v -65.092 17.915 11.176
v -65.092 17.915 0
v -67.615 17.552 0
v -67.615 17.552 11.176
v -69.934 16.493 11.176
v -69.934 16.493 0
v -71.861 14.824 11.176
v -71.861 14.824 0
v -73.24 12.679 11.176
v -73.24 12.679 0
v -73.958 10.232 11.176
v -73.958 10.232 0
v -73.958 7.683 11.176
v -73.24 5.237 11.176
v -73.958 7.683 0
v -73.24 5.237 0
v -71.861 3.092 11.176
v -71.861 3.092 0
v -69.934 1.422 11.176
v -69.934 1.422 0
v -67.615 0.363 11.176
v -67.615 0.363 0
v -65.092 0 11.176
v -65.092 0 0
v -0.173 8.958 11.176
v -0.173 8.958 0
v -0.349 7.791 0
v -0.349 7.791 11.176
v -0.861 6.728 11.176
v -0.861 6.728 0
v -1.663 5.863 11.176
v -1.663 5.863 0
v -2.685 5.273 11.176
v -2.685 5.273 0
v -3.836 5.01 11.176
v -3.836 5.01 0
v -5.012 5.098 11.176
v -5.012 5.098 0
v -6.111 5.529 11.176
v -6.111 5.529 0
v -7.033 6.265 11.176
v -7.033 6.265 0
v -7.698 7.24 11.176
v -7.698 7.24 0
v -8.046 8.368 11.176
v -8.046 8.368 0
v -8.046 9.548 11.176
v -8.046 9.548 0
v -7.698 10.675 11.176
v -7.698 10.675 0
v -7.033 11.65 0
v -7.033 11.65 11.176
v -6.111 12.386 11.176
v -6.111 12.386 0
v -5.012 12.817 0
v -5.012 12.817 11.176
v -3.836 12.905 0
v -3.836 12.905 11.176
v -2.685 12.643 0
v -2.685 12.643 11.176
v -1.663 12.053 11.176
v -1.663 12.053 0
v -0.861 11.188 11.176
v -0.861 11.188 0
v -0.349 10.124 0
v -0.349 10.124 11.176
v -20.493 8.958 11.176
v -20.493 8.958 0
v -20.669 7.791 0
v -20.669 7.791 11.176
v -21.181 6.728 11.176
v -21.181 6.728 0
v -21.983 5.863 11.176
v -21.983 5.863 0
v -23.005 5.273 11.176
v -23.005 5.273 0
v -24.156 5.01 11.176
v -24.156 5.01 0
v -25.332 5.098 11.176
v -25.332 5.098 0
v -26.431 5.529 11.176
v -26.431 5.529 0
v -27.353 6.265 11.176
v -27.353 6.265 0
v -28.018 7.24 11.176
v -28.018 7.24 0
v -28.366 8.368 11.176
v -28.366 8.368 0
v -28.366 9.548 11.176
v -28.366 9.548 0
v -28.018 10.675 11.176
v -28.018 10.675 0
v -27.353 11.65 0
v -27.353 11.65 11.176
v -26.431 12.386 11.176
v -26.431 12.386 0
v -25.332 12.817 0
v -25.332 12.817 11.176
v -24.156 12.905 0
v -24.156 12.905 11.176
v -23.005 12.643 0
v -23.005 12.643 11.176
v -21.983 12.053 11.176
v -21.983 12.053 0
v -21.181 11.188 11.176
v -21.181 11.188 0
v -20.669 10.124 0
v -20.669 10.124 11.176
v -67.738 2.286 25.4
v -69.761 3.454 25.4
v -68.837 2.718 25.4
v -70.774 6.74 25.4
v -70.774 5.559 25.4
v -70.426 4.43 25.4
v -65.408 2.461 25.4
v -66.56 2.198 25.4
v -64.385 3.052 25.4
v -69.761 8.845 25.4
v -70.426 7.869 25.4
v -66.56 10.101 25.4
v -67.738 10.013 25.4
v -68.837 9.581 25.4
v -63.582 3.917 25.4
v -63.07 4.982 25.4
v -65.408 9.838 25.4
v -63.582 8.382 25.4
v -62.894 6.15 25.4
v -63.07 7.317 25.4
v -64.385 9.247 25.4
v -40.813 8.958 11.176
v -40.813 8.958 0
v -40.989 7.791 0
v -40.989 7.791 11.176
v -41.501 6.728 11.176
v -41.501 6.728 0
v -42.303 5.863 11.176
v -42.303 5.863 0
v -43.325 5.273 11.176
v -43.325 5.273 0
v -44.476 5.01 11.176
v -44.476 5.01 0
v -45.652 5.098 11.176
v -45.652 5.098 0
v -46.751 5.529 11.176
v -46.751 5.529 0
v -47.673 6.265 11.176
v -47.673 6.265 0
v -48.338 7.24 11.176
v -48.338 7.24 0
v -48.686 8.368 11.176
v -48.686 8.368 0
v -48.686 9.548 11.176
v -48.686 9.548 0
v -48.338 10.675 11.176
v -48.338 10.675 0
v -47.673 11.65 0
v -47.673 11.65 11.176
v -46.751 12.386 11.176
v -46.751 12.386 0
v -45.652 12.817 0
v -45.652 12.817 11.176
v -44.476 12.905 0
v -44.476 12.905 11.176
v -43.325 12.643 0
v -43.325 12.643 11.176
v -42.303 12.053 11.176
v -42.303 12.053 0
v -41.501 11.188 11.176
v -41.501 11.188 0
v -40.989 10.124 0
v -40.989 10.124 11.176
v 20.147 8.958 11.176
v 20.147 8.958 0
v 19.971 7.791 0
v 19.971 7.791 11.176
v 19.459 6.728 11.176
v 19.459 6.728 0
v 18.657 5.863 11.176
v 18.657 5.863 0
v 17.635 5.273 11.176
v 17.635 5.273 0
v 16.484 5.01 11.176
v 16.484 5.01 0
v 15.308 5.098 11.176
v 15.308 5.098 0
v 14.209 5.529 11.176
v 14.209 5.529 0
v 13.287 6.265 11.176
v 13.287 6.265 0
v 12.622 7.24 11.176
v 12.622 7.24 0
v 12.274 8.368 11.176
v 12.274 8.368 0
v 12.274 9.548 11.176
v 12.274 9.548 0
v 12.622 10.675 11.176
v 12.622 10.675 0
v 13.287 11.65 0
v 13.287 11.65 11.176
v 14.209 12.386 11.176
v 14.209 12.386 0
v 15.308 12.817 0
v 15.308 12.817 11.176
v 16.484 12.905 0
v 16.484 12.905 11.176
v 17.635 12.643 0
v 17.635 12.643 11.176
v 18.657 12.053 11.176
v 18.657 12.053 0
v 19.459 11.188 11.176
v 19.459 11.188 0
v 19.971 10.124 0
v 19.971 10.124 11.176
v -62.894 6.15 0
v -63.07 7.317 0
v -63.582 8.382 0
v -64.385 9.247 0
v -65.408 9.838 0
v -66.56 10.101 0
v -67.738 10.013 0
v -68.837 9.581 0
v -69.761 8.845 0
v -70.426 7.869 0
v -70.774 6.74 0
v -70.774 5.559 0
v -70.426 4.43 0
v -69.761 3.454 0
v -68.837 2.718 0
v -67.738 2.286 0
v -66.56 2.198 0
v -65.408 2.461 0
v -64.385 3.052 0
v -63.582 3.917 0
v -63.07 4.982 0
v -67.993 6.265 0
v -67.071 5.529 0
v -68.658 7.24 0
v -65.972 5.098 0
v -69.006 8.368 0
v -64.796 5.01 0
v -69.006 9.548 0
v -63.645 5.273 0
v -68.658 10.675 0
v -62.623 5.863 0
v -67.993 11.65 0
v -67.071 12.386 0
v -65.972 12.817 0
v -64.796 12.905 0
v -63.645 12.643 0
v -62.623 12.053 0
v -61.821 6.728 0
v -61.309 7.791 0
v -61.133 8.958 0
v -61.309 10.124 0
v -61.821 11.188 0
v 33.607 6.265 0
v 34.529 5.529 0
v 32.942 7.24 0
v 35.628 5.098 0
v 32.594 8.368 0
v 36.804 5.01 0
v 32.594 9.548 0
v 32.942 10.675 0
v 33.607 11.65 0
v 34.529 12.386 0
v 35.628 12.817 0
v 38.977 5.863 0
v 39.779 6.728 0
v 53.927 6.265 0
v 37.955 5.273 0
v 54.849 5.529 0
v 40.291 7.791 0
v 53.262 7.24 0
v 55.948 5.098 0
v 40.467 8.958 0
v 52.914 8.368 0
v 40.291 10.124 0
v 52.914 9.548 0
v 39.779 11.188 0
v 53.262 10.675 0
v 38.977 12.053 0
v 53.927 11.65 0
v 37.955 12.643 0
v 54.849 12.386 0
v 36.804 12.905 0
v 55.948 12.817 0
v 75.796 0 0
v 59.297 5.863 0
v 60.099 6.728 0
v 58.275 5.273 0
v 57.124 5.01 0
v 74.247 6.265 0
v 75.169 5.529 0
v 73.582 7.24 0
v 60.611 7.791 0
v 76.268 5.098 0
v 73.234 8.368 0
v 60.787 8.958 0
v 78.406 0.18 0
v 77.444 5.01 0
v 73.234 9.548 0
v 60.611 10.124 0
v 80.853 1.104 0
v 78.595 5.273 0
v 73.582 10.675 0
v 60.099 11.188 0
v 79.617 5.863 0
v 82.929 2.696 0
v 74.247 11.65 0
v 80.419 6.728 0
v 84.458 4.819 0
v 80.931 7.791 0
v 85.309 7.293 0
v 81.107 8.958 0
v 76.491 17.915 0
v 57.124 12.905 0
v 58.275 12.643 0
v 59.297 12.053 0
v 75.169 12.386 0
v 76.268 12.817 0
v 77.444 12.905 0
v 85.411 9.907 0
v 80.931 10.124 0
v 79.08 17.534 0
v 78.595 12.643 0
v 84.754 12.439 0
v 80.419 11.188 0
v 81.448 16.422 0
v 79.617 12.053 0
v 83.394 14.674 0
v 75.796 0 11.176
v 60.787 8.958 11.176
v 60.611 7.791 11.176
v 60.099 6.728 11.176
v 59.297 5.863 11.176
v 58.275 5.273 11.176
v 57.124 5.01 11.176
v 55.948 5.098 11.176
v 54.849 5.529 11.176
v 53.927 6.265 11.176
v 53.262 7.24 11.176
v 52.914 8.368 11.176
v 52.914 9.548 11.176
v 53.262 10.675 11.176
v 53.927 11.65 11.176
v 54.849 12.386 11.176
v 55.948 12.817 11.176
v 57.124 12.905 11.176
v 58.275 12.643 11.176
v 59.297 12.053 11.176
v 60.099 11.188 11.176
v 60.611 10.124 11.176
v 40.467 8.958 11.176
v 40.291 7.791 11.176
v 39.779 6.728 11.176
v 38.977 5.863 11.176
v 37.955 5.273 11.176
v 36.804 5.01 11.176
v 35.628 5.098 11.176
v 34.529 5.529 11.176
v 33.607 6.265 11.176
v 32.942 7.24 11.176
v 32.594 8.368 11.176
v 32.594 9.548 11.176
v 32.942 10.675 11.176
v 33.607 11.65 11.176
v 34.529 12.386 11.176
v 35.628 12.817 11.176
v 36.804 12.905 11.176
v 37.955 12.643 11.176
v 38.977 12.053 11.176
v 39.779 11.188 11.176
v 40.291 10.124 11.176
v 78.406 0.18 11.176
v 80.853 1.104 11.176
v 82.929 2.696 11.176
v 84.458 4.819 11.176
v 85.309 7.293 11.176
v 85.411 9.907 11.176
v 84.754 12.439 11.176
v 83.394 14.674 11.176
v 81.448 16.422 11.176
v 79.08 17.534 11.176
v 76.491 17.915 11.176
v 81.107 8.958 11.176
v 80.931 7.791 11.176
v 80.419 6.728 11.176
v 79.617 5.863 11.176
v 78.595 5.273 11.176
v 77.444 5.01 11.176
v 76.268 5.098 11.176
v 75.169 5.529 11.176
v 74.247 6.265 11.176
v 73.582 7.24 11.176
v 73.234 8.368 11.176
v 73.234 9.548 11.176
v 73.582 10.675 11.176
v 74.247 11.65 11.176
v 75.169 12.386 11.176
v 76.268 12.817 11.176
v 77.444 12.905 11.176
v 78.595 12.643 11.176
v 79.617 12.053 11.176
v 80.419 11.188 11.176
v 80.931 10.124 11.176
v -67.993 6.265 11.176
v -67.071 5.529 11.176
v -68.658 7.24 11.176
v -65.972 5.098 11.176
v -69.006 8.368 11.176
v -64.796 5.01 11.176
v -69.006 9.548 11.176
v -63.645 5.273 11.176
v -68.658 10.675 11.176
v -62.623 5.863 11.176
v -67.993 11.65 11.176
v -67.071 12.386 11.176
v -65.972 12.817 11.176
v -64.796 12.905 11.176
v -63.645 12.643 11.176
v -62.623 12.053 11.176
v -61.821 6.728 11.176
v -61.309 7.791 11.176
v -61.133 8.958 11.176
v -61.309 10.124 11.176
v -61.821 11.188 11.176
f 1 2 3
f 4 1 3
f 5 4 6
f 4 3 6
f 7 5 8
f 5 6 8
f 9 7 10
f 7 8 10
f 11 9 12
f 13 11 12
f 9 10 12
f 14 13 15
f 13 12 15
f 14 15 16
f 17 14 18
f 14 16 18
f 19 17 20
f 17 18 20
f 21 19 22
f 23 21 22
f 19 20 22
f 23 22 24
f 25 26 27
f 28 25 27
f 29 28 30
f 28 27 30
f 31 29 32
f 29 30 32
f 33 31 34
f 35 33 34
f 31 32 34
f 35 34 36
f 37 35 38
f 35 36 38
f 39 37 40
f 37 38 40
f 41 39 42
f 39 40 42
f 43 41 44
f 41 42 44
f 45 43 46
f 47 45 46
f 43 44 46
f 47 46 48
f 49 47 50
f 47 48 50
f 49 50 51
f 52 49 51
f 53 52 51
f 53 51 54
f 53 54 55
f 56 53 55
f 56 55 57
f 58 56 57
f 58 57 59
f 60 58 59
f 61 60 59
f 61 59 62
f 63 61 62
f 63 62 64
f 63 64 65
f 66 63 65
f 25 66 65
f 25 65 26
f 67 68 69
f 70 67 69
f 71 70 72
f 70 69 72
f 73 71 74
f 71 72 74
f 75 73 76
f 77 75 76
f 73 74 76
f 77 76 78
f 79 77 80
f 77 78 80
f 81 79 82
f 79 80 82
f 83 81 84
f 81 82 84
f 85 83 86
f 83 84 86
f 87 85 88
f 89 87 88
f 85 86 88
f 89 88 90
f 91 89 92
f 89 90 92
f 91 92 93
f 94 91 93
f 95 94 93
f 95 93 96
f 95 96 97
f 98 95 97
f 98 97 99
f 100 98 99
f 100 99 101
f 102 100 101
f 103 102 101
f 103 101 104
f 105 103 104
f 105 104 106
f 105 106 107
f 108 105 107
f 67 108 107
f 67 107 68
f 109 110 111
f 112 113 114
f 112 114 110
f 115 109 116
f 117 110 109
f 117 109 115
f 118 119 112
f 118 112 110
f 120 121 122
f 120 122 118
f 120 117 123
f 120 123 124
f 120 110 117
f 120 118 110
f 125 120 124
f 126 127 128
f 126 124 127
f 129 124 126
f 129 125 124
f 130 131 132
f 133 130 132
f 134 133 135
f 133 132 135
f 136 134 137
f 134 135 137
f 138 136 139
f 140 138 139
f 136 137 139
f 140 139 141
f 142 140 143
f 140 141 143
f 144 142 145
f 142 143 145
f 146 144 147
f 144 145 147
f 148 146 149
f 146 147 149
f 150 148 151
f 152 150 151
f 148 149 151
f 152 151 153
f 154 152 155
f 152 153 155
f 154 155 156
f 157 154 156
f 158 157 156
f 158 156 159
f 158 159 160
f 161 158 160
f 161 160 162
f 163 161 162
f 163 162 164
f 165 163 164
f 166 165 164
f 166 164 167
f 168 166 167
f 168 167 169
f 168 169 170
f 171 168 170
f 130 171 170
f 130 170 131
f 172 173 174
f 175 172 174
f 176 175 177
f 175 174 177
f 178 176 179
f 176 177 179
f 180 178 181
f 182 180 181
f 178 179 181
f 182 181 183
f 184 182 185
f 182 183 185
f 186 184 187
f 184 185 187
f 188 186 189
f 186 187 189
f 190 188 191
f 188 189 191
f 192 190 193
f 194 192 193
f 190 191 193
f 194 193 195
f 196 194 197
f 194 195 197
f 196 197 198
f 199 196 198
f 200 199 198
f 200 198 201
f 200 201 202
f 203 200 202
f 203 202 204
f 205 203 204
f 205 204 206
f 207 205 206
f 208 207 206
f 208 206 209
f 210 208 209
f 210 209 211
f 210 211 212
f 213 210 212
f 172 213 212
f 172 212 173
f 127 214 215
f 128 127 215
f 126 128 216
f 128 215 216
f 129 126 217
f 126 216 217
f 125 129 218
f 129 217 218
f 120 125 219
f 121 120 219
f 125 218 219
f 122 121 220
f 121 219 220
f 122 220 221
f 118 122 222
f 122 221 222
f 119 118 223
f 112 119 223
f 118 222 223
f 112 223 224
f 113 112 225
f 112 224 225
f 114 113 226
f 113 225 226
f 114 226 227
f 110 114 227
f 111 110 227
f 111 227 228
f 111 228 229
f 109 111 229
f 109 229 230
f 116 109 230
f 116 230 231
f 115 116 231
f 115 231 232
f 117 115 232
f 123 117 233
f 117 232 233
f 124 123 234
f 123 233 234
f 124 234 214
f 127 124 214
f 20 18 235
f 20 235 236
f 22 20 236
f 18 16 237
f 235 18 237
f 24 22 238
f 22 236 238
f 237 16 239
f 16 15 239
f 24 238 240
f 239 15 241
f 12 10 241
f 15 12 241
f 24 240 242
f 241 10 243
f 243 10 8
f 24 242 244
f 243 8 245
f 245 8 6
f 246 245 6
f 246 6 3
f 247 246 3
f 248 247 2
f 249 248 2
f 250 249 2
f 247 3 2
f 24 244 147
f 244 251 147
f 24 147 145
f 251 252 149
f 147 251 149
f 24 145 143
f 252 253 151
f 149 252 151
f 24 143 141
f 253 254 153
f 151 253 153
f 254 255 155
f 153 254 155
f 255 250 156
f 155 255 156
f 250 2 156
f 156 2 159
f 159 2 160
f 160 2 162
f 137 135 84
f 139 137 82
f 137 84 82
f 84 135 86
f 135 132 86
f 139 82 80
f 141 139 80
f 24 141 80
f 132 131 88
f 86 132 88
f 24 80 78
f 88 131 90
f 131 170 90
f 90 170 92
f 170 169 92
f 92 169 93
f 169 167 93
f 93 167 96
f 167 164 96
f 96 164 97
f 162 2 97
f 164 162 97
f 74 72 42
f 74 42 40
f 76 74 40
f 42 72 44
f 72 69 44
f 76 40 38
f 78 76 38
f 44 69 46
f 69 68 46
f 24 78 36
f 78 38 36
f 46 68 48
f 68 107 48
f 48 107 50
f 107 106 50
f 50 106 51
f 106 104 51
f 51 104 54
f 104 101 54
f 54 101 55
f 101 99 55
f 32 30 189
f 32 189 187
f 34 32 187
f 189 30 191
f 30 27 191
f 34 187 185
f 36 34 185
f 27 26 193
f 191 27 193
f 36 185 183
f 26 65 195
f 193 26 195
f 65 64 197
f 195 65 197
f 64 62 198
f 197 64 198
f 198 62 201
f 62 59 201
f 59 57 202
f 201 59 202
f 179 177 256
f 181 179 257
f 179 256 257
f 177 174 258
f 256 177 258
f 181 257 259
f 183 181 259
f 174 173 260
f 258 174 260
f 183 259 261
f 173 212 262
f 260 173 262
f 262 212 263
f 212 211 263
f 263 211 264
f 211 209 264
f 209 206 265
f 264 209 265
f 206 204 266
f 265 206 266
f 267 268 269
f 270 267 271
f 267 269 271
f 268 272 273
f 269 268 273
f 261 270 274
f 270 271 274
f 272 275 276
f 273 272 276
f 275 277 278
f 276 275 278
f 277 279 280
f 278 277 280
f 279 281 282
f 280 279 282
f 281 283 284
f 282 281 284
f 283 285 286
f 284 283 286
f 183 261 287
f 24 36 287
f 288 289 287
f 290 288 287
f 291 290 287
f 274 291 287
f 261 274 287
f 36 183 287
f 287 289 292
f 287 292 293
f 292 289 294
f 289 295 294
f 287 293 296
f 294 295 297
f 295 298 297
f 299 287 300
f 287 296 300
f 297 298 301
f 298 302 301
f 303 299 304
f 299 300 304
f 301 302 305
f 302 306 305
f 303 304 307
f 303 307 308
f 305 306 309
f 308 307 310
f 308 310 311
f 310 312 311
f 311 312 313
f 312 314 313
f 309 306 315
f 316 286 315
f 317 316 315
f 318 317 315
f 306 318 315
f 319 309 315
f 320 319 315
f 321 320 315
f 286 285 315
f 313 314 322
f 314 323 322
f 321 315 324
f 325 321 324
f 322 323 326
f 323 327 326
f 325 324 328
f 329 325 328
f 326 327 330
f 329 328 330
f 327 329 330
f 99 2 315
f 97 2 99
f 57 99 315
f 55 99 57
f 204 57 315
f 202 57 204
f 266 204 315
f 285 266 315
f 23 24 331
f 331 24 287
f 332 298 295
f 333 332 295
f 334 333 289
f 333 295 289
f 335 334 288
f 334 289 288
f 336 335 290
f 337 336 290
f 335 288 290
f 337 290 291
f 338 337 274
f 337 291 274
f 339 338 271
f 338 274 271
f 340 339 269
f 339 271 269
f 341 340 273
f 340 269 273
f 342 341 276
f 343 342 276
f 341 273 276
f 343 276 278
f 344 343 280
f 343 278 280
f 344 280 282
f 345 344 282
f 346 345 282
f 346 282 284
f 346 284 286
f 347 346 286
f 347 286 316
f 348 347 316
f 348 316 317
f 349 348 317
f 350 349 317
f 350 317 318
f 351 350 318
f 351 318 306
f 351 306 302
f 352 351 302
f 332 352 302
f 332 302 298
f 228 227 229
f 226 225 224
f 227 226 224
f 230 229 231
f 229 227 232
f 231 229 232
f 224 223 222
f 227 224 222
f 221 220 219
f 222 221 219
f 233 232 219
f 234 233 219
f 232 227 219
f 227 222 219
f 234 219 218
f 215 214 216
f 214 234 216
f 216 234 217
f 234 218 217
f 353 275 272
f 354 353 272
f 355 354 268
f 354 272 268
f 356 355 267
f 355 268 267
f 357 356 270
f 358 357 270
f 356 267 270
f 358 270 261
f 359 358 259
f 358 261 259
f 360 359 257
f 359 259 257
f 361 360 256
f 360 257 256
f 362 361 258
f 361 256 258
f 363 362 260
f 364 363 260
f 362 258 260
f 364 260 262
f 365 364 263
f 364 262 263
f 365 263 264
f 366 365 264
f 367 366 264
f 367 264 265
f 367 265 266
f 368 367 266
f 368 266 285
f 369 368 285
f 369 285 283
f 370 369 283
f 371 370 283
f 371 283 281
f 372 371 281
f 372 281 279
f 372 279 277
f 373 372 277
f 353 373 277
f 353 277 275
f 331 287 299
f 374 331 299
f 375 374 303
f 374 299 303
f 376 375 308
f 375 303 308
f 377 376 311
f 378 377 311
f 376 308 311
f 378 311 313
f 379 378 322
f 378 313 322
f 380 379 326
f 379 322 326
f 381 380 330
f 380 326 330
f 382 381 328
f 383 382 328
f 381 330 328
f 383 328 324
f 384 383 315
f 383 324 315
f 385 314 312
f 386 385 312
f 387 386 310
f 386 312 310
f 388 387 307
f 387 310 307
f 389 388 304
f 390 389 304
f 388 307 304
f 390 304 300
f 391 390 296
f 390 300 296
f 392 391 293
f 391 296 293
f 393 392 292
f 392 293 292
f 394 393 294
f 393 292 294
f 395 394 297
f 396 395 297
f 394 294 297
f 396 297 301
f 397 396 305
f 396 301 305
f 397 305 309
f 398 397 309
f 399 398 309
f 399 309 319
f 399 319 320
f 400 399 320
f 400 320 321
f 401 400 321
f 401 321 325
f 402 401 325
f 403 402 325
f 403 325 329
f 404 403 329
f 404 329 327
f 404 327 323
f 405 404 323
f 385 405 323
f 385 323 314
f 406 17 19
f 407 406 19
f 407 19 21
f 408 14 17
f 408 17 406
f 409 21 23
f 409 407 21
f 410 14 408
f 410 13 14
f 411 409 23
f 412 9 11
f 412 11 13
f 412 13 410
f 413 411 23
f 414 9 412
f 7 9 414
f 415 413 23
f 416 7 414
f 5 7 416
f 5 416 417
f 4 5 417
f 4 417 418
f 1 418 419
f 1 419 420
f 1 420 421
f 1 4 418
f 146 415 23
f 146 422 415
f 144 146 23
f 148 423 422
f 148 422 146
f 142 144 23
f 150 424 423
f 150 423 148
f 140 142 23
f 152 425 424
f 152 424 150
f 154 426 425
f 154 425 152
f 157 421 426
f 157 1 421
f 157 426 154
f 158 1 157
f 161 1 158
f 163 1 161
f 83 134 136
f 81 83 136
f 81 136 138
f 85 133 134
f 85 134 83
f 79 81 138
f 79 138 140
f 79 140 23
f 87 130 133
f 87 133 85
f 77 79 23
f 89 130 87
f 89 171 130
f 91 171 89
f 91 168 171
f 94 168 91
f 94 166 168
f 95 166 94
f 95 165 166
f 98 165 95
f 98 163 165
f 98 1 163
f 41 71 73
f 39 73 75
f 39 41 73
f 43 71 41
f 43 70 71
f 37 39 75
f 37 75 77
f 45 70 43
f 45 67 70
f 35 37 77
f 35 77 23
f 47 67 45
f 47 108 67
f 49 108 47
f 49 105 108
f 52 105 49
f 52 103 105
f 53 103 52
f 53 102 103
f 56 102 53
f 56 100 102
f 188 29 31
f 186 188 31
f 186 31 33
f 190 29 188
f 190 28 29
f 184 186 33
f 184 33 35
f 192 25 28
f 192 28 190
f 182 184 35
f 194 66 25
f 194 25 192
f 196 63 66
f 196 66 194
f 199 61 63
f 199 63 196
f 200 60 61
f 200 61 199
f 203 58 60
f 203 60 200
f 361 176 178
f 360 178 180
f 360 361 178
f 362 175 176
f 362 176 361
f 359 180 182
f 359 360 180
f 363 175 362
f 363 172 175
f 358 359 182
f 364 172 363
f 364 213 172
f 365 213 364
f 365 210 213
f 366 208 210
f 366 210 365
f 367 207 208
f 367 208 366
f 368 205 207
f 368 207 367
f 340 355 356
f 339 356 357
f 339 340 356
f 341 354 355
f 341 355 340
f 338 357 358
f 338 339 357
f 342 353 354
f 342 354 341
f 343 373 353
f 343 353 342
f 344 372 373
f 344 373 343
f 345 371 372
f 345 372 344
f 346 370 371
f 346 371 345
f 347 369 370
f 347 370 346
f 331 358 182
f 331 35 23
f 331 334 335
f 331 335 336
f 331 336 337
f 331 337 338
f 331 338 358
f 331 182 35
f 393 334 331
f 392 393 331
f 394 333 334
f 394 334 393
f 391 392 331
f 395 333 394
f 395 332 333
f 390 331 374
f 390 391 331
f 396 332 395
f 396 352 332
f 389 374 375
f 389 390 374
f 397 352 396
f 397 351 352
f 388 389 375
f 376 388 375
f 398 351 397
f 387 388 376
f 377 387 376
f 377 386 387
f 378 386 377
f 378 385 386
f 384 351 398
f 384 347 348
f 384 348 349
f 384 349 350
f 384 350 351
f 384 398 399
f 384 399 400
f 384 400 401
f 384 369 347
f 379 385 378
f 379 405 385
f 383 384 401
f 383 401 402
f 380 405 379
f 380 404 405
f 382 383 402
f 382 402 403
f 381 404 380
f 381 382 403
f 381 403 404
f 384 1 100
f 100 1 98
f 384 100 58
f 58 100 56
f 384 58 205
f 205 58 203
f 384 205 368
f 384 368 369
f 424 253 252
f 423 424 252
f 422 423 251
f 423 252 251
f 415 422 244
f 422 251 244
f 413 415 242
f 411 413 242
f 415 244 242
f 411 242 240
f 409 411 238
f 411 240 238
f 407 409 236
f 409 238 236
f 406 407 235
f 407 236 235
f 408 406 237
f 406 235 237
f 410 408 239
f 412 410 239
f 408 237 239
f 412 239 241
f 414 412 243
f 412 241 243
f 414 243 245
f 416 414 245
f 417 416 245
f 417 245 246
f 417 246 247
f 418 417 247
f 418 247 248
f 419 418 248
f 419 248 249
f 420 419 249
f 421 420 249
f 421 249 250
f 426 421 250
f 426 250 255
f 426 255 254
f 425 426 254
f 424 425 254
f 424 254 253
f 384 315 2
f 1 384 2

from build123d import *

# Parameters (mm, degrees)
F1_DEPTH = 11.176
F2_R     = 3.958604
F3_DEPTH = 25.4
F4_R     = 3.9624
F5_DEPTH = 25.4


with BuildPart() as f1:
    # F0 (on Top) → F1 (new body)
    with BuildSketch(Plane.XY):
        with BuildLine():
            ThreePointArc((-65.091506, 17.915282), (-74.049147, 8.957641), (-65.091506, 0))
            Line((-65.091506, 0), (75.795665, 0))
            ThreePointArc((75.795665, 0), (85.455802, 8.595998), (76.491408, 17.915282))
            Line((76.491408, 17.915282), (-65.091506, 17.915282))
        make_face()
    extrude(amount=F1_DEPTH)

    # F2 (on face) → F3 (cut)
    with BuildSketch(Plane(origin=(0, 0, 0), x_dir=(1, 0, 0), z_dir=(0, 0, -1))):
        with Locations((-24.451506, -8.957641)):
            Circle(F2_R)
        with Locations((-4.131506, -8.957641)):
            Circle(F2_R)
        with Locations((16.188494, -8.957641)):
            Circle(F2_R)
        with Locations((36.508494, -8.957641)):
            Circle(F2_R)
        with Locations((56.828494, -8.957641)):
            Circle(F2_R)
        with Locations((77.148494, -8.957641)):
            Circle(F2_R)
        with Locations((-44.771506, -8.957641)):
            Circle(F2_R)
        with Locations((-65.091506, -8.957641)):
            Circle(F2_R)
    extrude(amount=-F3_DEPTH, mode=Mode.SUBTRACT)


with BuildPart() as f5:
    # F4 (on Top) → F5 (new body)
    with BuildSketch(Plane.XY):
        with Locations((-66.855967, 6.149523)):
            Circle(F4_R)
    extrude(amount=F5_DEPTH)


solid = Compound([f1.part, f5.part])
